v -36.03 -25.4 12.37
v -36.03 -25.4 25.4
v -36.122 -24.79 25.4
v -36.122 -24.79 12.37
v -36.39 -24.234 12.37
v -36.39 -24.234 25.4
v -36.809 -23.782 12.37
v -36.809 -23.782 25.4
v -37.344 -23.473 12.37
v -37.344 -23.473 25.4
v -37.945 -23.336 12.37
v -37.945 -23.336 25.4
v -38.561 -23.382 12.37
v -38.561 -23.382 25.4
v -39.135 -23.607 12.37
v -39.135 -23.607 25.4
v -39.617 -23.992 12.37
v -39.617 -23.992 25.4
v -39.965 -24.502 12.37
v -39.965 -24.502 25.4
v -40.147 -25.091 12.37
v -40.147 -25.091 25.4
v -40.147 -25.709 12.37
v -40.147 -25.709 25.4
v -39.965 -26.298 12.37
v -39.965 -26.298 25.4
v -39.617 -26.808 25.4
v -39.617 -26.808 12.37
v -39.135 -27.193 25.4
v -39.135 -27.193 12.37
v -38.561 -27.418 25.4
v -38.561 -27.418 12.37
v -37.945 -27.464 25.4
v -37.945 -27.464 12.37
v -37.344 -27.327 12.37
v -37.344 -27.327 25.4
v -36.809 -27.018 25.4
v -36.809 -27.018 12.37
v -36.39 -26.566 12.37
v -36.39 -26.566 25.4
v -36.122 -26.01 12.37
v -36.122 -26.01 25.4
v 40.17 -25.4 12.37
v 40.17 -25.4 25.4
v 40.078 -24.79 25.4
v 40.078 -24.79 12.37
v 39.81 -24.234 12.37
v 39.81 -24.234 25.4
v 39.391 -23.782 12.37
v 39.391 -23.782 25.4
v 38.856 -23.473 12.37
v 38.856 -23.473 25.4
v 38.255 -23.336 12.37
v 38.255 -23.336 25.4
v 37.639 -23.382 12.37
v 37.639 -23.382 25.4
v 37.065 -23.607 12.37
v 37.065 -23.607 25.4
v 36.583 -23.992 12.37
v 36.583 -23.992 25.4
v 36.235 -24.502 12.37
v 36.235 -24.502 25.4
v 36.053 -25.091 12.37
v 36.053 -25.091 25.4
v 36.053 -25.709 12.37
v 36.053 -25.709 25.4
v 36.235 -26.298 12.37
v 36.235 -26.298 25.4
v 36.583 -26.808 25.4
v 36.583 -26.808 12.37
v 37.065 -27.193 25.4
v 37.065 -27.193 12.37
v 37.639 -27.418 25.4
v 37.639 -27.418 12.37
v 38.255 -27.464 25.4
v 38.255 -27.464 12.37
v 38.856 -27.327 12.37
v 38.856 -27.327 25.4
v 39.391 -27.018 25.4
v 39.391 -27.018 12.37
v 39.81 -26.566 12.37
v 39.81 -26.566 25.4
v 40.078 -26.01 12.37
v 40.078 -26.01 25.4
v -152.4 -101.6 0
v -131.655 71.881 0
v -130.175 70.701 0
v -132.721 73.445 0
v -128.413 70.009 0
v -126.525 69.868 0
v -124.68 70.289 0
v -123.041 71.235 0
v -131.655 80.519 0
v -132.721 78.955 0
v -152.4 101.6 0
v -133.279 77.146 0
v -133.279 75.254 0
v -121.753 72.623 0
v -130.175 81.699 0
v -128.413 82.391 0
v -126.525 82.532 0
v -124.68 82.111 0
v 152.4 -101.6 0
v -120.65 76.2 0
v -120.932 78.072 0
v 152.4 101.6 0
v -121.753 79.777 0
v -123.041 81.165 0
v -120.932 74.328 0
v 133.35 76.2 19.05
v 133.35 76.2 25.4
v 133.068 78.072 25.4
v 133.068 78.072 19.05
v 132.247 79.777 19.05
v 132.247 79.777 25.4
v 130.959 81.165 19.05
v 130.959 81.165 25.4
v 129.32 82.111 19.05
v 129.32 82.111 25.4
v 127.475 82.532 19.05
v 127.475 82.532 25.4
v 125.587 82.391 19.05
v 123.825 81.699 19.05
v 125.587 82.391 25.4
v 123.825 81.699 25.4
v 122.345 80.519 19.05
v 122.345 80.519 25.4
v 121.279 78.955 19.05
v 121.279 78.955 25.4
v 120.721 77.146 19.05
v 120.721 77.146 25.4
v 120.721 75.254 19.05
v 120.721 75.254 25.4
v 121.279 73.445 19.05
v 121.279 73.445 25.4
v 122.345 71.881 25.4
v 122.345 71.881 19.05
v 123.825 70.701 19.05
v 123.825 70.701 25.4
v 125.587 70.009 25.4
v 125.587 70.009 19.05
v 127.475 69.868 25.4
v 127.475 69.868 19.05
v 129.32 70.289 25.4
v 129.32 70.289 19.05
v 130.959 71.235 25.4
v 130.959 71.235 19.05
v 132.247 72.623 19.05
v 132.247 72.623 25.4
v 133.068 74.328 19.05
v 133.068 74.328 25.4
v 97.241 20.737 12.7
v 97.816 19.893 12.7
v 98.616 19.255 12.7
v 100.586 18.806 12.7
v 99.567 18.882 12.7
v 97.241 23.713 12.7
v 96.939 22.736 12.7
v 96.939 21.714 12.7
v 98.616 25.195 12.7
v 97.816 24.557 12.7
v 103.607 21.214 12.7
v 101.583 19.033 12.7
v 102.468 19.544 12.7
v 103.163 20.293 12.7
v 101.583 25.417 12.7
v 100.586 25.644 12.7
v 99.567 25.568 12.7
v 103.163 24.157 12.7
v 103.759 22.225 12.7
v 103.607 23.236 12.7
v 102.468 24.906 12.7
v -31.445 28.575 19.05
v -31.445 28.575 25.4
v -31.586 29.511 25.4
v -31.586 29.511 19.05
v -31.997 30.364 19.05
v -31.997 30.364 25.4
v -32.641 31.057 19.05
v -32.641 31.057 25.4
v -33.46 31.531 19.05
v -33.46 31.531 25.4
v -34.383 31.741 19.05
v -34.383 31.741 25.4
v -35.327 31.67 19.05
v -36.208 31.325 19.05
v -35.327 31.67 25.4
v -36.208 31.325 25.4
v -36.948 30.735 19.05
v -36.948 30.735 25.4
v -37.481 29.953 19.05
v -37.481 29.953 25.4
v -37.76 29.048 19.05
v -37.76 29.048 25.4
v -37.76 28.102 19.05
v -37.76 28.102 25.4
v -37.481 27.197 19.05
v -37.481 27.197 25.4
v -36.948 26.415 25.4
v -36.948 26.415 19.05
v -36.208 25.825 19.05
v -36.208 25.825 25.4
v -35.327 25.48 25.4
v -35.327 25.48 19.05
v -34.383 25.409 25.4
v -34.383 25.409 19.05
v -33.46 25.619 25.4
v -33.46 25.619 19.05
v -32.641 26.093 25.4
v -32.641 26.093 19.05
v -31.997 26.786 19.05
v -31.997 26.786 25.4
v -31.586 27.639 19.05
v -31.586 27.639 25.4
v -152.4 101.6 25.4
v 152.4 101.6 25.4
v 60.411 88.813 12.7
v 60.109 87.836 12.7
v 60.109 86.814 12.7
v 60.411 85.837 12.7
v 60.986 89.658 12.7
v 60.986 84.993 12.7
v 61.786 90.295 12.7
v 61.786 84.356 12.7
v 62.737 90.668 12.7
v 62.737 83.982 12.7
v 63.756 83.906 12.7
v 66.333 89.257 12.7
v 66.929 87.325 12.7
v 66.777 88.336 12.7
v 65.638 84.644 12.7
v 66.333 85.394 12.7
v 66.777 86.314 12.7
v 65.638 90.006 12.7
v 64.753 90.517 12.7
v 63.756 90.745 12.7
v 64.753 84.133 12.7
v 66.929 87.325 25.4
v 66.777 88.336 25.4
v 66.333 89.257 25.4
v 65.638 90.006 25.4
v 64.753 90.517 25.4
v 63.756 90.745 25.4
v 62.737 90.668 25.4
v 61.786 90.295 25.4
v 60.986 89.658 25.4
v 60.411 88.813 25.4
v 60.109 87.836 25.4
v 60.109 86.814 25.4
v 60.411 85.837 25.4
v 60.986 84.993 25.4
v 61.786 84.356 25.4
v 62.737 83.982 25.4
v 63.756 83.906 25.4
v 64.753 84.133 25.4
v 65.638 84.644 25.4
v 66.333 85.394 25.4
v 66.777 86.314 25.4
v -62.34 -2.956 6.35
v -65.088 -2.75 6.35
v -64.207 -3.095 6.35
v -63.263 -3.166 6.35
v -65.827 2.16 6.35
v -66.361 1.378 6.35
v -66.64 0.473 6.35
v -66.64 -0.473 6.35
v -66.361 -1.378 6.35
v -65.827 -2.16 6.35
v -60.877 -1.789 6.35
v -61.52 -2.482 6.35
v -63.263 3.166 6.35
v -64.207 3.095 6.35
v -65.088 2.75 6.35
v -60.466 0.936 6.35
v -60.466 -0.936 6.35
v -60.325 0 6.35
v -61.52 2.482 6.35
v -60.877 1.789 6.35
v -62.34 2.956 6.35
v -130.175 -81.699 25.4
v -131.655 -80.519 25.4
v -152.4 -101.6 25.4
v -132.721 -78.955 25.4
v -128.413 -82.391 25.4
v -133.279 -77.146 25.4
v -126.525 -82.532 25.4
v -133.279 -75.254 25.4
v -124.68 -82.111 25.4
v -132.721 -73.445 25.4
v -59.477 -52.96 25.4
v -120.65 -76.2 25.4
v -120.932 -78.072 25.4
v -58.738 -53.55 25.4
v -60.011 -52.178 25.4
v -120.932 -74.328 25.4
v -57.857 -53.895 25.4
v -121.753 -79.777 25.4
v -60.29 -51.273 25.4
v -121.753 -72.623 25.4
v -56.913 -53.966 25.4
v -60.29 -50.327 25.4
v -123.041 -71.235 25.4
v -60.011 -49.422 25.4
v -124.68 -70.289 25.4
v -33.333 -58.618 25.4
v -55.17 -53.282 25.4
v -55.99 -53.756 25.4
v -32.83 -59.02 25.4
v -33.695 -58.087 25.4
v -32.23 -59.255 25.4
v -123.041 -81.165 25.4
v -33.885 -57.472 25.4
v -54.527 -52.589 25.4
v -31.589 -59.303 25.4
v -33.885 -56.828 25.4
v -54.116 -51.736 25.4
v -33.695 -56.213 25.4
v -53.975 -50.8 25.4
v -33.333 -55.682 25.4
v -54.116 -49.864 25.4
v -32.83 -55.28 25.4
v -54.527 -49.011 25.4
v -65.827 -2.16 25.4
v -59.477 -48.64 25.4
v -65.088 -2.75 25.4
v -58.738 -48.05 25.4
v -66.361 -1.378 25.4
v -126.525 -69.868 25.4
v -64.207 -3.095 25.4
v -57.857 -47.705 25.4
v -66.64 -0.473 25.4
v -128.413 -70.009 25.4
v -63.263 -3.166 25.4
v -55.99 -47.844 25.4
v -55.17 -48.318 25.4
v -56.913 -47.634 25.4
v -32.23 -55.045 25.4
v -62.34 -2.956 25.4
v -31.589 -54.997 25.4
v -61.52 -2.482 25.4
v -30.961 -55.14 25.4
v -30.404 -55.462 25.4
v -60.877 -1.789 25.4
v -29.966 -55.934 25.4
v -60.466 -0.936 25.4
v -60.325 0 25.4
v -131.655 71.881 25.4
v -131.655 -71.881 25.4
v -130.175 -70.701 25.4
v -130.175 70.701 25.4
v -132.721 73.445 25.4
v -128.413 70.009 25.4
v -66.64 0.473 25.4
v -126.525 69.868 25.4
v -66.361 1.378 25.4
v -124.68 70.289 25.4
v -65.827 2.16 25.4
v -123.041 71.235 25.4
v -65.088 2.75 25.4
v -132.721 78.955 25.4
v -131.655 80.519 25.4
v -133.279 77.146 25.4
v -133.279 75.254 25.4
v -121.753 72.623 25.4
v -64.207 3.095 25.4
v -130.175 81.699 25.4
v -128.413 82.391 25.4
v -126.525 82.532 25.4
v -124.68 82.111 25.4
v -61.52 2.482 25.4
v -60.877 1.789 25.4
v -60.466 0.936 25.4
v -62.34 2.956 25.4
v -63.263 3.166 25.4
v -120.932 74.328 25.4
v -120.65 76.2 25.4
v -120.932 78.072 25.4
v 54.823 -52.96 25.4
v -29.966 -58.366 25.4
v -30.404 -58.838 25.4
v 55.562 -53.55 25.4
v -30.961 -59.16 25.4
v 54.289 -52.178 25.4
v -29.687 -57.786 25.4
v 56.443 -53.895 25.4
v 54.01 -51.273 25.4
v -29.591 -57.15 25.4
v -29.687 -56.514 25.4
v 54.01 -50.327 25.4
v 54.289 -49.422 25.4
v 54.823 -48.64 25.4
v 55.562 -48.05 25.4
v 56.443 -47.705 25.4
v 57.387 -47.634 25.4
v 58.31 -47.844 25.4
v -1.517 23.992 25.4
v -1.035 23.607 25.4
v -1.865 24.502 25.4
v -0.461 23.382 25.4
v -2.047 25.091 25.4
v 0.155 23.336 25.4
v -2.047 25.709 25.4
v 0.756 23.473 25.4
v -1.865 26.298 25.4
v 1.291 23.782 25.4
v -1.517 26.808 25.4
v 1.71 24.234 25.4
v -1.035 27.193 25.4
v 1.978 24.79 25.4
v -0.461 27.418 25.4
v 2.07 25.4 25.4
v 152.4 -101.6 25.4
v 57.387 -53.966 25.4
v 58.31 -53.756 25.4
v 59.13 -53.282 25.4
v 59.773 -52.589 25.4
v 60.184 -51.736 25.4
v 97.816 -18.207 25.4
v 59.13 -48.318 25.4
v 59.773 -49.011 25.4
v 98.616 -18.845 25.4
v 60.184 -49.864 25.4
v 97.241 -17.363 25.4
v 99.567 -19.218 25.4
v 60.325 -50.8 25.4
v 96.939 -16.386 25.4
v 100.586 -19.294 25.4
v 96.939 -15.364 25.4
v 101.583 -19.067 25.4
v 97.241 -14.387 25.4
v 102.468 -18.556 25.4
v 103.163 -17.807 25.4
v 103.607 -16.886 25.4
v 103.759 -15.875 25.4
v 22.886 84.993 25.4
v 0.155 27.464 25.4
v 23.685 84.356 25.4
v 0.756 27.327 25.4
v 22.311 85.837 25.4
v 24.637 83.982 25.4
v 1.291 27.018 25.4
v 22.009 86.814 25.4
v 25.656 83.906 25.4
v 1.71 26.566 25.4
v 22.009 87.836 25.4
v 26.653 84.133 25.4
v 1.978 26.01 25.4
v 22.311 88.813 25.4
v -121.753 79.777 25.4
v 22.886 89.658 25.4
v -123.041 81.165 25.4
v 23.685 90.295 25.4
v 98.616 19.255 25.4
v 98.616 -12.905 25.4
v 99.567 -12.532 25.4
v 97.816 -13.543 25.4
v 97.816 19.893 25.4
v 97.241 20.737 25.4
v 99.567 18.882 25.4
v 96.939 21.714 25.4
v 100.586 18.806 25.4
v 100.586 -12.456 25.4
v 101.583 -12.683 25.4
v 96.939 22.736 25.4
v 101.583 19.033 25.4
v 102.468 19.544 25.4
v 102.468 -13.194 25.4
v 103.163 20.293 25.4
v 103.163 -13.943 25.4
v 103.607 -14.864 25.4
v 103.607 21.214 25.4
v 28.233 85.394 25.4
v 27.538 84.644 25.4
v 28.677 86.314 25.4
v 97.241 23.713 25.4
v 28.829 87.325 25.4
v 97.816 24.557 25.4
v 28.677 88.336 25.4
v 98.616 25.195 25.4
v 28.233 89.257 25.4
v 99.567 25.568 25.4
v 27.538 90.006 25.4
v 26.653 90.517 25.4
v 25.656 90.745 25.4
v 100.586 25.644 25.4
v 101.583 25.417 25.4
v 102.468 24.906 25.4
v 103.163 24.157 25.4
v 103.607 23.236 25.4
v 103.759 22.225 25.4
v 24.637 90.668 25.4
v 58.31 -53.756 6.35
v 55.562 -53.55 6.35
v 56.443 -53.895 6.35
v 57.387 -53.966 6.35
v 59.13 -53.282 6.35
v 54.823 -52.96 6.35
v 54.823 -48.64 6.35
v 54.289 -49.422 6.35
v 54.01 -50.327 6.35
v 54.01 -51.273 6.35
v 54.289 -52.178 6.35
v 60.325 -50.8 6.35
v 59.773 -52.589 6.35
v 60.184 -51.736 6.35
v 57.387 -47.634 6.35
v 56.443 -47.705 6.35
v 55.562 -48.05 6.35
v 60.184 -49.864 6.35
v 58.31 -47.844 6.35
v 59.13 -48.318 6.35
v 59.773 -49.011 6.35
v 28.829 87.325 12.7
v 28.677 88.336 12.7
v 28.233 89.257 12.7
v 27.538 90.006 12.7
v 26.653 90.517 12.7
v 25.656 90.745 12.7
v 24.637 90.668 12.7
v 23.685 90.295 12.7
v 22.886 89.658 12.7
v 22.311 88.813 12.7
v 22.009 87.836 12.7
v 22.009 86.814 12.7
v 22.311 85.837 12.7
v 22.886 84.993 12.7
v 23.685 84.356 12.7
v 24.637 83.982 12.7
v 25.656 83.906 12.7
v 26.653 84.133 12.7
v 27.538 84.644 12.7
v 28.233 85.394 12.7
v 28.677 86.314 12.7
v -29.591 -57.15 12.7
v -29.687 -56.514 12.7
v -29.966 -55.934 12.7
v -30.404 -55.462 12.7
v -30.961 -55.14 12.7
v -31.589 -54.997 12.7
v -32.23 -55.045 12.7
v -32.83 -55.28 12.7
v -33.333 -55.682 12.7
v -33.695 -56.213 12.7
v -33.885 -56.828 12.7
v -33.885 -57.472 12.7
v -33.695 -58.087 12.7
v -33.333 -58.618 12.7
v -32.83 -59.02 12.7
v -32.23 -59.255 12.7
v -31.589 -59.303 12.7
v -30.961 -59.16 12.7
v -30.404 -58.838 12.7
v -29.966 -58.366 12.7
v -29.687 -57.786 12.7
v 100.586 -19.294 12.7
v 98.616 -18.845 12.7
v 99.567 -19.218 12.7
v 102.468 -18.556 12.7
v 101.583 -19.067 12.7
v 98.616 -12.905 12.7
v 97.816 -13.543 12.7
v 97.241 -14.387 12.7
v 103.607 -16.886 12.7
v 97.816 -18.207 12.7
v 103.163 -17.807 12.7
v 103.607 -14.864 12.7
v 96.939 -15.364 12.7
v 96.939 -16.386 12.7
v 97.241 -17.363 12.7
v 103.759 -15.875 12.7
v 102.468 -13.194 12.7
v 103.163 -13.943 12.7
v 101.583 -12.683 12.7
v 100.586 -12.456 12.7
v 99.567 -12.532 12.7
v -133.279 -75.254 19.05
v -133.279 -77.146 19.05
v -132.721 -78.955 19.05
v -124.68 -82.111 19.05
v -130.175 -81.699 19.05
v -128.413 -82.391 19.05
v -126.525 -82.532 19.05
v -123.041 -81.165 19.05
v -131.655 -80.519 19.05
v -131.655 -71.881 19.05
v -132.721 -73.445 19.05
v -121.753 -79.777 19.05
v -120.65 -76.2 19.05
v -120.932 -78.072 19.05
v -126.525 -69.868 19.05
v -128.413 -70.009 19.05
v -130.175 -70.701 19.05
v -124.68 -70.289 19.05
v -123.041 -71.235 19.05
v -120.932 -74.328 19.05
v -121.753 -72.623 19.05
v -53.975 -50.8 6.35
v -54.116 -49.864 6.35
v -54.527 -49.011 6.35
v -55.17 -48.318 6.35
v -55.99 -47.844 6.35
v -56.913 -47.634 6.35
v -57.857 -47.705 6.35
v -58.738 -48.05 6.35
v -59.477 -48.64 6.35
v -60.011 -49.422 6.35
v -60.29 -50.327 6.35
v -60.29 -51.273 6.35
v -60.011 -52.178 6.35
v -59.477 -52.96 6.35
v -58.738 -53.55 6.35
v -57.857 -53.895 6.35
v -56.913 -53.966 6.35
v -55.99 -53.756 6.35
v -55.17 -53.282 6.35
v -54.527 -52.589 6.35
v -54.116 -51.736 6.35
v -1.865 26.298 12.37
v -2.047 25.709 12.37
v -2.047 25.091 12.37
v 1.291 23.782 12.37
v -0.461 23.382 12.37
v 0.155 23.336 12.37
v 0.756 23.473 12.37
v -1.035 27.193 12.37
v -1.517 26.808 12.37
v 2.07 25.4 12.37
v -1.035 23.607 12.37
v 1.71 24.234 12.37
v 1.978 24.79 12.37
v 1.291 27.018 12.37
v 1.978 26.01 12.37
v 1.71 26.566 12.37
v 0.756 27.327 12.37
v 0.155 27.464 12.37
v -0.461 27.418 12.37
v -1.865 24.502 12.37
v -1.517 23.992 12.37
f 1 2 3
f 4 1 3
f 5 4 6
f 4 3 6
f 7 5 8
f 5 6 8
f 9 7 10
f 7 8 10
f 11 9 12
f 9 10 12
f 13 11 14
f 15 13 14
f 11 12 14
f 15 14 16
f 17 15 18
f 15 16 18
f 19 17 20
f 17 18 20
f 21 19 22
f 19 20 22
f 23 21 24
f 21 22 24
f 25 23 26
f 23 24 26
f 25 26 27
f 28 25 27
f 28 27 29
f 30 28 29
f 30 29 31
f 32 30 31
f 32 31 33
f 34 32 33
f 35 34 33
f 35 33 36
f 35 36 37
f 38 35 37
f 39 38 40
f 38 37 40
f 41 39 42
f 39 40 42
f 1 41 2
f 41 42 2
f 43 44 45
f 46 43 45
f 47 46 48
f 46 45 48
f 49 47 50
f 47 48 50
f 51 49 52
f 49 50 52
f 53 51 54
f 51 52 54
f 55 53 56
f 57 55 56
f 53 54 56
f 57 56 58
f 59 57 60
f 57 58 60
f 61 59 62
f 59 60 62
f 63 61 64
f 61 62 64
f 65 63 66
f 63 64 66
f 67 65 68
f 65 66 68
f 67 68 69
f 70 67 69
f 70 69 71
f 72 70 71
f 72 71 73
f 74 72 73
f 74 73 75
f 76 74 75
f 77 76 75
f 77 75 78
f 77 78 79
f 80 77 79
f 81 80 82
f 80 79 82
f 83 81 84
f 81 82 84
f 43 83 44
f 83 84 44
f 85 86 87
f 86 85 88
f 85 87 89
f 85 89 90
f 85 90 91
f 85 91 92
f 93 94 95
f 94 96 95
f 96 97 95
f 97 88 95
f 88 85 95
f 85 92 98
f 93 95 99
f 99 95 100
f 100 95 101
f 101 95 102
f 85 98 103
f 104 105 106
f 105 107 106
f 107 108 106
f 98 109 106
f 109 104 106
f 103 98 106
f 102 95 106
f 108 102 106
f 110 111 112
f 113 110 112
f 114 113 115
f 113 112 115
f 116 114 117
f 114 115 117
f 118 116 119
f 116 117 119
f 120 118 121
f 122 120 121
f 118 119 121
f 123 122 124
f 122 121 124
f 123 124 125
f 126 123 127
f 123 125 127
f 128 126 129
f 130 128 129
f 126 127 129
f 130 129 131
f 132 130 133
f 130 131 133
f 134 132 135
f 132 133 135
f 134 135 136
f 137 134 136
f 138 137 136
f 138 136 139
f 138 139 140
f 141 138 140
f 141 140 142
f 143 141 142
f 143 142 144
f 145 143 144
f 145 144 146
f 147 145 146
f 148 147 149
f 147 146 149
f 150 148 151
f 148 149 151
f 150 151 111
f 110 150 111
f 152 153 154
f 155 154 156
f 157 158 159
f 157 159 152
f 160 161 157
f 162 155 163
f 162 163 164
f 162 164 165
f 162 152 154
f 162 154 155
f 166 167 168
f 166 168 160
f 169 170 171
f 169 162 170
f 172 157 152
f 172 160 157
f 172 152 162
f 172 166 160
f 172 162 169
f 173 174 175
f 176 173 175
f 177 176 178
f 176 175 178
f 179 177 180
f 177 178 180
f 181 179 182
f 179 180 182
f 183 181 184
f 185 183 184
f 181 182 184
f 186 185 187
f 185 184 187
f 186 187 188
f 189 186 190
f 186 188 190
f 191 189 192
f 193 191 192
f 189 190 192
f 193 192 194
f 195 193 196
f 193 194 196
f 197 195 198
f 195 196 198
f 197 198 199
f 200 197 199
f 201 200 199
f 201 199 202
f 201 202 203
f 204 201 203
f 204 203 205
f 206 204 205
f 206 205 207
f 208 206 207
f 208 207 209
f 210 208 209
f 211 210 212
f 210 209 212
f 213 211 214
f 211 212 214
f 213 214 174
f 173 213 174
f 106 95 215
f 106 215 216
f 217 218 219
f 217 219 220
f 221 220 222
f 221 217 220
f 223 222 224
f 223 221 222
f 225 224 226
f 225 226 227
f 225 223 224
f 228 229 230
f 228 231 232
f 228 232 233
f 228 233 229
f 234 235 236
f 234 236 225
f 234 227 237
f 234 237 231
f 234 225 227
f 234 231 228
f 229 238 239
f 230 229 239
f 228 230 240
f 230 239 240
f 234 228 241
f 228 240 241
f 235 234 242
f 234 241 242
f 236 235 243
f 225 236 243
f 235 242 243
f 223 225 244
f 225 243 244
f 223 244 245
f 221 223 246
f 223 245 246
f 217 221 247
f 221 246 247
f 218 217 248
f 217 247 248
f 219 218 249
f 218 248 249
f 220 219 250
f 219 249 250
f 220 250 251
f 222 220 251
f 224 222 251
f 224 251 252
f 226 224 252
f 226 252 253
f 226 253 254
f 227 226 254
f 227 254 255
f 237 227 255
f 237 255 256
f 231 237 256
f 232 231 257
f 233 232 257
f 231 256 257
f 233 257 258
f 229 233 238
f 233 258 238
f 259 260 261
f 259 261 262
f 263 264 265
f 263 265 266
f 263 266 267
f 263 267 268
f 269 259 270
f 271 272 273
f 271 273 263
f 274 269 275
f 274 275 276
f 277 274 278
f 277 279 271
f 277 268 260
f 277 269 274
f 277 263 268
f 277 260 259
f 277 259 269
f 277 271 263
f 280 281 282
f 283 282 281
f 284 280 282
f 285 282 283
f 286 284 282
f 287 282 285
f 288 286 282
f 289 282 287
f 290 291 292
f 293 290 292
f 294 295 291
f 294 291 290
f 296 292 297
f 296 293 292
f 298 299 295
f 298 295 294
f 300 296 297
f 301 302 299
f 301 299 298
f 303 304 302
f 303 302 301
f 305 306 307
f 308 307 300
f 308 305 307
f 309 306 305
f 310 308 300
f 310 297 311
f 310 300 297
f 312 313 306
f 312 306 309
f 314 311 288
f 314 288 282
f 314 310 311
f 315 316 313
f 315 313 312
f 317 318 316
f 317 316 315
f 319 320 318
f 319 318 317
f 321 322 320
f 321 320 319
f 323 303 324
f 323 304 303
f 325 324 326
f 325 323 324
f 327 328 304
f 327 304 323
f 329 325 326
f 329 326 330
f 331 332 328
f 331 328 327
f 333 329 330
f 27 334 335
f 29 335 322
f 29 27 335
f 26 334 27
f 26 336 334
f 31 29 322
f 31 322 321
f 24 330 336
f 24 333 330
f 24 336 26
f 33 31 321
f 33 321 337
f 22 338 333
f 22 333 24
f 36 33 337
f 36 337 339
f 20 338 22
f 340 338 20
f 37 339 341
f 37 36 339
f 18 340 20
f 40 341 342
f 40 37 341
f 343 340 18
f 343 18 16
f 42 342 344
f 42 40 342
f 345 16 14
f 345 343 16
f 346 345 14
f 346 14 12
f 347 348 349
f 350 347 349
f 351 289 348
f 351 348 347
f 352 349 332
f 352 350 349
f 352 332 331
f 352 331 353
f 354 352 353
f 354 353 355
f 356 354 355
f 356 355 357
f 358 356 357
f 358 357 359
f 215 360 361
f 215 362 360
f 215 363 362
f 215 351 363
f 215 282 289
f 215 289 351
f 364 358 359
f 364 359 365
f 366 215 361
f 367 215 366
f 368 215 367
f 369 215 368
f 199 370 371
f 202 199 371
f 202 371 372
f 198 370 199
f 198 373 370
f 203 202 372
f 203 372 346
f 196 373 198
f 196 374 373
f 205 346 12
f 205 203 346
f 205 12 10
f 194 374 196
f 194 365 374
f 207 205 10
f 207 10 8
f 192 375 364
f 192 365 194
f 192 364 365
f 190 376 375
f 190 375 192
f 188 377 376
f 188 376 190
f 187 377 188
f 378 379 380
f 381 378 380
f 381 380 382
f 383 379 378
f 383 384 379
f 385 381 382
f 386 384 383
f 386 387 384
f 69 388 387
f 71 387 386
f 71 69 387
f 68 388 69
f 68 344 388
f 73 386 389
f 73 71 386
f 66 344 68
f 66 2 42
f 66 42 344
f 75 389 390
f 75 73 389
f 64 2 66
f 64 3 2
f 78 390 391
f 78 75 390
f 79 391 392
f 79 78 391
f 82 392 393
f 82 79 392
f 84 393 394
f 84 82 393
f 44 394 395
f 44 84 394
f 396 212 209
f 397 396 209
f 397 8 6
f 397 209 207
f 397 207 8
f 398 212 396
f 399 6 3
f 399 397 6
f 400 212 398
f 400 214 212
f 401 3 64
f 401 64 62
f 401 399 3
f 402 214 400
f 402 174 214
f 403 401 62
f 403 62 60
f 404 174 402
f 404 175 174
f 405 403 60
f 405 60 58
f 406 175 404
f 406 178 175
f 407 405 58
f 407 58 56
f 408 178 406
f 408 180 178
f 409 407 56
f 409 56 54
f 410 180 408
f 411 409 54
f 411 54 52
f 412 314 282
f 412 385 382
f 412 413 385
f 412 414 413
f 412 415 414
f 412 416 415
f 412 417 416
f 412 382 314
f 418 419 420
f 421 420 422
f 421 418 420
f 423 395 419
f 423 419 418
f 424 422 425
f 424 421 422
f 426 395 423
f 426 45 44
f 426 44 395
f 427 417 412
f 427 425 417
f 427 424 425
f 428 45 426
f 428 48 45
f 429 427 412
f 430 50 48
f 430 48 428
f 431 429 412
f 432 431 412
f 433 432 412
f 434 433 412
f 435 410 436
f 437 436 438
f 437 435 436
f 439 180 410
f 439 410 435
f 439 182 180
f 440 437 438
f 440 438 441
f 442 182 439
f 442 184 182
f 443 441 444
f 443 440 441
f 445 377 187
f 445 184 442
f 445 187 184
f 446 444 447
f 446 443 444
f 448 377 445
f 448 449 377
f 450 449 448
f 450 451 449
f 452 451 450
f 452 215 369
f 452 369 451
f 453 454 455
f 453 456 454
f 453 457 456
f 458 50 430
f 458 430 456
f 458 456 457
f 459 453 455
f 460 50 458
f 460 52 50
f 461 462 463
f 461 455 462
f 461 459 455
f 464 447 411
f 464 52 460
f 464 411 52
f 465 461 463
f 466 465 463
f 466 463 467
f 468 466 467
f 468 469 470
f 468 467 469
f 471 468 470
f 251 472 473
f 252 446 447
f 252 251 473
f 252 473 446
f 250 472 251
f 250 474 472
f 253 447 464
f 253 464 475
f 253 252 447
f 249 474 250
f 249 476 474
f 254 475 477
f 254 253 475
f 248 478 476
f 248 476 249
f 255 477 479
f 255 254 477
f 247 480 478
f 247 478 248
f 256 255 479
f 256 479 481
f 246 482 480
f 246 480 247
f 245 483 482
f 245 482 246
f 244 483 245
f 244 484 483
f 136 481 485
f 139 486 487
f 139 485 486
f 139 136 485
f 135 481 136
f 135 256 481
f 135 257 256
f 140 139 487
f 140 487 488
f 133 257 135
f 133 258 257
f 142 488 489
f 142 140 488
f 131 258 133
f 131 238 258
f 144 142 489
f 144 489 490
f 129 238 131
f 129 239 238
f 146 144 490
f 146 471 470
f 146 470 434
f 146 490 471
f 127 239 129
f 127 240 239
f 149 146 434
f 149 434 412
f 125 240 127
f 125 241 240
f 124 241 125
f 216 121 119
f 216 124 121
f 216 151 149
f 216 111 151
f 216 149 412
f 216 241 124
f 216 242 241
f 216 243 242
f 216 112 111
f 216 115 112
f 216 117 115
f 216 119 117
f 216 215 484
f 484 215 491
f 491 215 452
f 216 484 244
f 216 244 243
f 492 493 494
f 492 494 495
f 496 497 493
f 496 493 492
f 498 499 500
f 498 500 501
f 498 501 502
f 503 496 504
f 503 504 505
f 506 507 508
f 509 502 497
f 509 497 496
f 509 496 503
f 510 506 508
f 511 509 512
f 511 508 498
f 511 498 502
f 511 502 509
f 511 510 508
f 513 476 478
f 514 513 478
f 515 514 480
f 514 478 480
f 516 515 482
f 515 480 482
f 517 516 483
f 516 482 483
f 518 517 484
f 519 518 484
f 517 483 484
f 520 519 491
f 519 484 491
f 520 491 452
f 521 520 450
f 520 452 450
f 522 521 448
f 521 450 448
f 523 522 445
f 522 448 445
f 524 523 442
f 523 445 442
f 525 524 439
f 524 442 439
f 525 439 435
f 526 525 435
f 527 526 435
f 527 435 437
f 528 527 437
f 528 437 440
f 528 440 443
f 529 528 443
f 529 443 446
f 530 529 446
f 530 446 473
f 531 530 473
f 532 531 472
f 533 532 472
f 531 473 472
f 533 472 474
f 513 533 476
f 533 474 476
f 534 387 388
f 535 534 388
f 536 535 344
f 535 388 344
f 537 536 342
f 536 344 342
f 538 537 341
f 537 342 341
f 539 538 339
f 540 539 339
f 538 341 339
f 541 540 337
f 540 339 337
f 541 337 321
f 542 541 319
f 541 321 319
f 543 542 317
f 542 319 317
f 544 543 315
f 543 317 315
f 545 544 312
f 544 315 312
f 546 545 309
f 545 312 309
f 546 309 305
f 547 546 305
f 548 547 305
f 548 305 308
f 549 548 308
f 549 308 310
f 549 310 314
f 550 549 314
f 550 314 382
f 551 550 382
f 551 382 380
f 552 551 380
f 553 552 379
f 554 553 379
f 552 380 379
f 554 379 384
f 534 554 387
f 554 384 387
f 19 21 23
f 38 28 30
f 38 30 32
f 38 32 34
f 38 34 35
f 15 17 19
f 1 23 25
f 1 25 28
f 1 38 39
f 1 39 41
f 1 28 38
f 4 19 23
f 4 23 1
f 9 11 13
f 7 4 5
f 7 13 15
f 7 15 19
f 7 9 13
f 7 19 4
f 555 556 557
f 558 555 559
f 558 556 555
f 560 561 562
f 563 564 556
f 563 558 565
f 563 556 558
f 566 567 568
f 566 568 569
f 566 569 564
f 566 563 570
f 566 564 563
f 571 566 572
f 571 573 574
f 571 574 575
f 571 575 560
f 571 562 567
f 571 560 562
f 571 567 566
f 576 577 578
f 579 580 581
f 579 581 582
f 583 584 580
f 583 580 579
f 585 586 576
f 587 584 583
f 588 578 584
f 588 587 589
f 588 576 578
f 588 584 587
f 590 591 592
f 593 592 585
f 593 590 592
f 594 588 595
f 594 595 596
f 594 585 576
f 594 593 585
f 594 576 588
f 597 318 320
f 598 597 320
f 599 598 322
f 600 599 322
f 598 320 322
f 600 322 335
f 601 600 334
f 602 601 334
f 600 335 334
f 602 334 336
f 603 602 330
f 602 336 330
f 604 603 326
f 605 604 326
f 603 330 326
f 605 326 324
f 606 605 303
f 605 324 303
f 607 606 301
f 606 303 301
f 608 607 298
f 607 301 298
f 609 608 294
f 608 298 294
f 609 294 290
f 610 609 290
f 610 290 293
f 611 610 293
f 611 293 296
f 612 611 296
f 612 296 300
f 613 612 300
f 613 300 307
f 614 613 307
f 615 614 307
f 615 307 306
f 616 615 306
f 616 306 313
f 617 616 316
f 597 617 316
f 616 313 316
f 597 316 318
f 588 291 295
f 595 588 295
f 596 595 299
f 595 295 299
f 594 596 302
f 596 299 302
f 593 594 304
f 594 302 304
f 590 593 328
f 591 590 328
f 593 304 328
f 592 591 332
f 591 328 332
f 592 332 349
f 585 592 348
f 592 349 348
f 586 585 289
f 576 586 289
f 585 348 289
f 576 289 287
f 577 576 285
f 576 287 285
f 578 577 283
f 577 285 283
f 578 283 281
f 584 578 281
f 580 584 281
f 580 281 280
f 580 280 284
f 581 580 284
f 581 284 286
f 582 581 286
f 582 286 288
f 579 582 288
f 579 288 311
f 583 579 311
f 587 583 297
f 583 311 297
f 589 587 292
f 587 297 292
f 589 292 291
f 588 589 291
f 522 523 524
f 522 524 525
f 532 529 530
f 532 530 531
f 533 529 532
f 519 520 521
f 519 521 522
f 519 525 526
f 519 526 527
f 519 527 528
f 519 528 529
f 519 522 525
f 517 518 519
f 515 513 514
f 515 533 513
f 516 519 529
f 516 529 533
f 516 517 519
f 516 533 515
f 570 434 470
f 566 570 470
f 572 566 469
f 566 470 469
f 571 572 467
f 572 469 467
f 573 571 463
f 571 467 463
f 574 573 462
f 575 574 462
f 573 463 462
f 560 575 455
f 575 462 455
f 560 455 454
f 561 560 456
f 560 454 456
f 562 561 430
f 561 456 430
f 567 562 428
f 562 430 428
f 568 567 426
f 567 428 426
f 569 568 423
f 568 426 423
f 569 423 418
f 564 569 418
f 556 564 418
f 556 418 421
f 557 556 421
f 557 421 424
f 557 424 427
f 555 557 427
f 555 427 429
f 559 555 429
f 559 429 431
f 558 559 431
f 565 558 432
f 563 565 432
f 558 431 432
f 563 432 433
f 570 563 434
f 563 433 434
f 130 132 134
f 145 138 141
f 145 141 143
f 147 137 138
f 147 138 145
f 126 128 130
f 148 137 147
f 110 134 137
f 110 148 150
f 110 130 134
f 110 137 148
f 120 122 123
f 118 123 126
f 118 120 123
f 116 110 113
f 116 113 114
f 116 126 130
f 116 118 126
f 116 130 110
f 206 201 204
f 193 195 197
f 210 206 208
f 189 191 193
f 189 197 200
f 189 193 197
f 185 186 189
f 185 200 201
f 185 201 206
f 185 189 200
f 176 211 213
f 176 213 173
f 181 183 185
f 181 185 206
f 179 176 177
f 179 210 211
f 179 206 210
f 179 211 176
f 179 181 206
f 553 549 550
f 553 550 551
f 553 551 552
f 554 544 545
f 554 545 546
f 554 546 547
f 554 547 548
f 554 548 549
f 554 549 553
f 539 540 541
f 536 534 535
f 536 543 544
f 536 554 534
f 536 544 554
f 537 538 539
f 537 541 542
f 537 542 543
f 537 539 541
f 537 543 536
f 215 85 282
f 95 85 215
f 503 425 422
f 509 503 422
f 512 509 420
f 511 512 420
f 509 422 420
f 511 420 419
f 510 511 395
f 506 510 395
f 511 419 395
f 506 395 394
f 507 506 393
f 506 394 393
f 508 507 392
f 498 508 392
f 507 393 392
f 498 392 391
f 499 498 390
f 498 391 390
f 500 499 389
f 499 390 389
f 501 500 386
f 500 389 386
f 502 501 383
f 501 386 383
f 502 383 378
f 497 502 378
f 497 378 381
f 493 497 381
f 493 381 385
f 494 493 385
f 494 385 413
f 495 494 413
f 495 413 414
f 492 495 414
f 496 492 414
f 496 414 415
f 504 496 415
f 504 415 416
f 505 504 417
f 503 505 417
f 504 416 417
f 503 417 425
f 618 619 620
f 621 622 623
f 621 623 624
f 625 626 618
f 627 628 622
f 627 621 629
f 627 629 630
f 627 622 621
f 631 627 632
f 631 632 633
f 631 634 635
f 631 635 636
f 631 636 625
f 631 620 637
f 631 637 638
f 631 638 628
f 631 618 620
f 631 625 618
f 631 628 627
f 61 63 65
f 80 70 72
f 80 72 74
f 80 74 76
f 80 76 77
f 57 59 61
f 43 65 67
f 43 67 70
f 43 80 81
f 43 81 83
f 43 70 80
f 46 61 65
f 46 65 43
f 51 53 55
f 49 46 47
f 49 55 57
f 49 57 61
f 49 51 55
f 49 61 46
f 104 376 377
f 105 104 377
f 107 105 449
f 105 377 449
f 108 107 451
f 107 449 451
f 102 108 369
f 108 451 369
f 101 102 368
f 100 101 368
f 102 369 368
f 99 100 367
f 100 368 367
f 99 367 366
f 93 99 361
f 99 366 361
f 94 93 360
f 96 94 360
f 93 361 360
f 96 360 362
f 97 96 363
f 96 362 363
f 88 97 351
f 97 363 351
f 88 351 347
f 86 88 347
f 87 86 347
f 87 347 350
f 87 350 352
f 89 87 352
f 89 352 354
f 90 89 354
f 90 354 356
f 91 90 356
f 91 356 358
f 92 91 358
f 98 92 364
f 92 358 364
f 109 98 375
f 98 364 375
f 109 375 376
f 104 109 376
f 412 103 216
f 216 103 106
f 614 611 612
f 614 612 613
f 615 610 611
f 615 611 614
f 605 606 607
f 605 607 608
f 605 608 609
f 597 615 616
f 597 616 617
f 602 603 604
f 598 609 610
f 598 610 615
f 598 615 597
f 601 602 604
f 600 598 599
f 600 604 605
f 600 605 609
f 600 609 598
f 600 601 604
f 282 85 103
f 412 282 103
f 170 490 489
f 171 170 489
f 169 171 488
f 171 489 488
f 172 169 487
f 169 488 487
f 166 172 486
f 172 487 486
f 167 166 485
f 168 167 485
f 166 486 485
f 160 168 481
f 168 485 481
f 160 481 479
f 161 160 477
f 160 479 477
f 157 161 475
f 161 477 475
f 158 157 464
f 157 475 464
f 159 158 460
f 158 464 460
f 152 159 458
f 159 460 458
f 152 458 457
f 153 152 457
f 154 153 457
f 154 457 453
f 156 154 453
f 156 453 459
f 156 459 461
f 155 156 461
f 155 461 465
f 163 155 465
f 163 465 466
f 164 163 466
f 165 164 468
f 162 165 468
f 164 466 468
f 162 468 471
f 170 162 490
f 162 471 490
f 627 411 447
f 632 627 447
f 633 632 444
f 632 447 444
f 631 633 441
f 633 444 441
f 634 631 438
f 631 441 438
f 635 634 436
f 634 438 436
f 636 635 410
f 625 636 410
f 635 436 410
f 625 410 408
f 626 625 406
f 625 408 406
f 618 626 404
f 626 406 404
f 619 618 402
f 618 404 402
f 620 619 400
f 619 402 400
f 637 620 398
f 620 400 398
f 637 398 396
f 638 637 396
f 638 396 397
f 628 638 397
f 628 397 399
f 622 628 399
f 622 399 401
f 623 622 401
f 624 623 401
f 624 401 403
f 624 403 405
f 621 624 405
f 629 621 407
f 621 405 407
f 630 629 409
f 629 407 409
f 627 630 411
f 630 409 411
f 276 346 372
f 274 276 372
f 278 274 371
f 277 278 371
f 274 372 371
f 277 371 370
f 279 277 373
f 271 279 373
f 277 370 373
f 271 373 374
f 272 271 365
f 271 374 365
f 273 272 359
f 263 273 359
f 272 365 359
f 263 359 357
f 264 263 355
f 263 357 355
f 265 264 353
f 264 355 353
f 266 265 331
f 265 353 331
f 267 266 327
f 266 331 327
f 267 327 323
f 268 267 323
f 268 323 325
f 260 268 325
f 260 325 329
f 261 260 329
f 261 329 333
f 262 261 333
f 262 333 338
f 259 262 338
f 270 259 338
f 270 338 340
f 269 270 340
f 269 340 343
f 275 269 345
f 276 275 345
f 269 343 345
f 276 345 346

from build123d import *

# Parameters (mm, degrees)
F0_W      = 304.8
F0_H      = 203.2
F1_DEPTH  = 25.4
F2_R      = 6.35
F3_DEPTH  = 6.35
F4_R      = 3.175
F5_DEPTH  = 19.05
F6_R      = 2.0701
F7_DEPTH  = 13.0302
F8_R      = 3.429
F9_DEPTH  = 12.7
F10_R     = 3.175
F11_DEPTH = 6.35
F12_R     = 3.429
F13_DEPTH = 12.7
F14_R     = 2.159
F15_DEPTH = 12.7
F16_R     = 6.35
F17_DEPTH = 25.4


with BuildPart() as f1:
    # F0 (on Top) → F1 (new body)
    with BuildSketch(Plane.XY):
        Rectangle(F0_W, F0_H)
    extrude(amount=F1_DEPTH)

    # F2 (on face) → F3 (cut)
    with BuildSketch(Plane.XY.offset(25.4)):
        with Locations((-127, -76.2)):
            Circle(F2_R)
        with Locations((127, 76.2)):
            Circle(F2_R)
    extrude(amount=-F3_DEPTH, mode=Mode.SUBTRACT)

    # F4 (on face) → F5 (cut)
    with BuildSketch(Plane.XY.offset(25.4)):
        with Locations((-57.15, -50.8)):
            Circle(F4_R)
        with Locations((57.15, -50.8)):
            Circle(F4_R)
        with Locations((-63.5, 0)):
            Circle(F4_R)
    extrude(amount=-F5_DEPTH, mode=Mode.SUBTRACT)

    # F6 (on face) → F7 (cut)
    with BuildSketch(Plane.XY.offset(25.4)):
        with Locations((0, 25.4)):
            Circle(F6_R)
        with Locations((-38.1, -25.4)):
            Circle(F6_R)
        with Locations((38.1, -25.4)):
            Circle(F6_R)
    extrude(amount=-F7_DEPTH, mode=Mode.SUBTRACT)

    # F8 (on face) → F9 (cut)
    with BuildSketch(Plane.XY.offset(25.4)):
        with Locations((25.4, 87.3252)):
            Circle(F8_R)
        with Locations((63.5, 87.3252)):
            Circle(F8_R)
    extrude(amount=-F9_DEPTH, mode=Mode.SUBTRACT)

    # F10 (on face) → F11 (cut)
    with BuildSketch(Plane.XY.offset(25.4)):
        with Locations((-34.6202, 28.575)):
            Circle(F10_R)
    extrude(amount=-F11_DEPTH, mode=Mode.SUBTRACT)

    # F12 (on face) → F13 (cut)
    with BuildSketch(Plane.XY.offset(25.4)):
        with Locations((100.33, 22.225)):
            Circle(F12_R)
        with Locations((100.33, -15.875)):
            Circle(F12_R)
    extrude(amount=-F13_DEPTH, mode=Mode.SUBTRACT)

    # F14 (on face) → F15 (cut)
    with BuildSketch(Plane.XY.offset(25.4)):
        with Locations((-31.75, -57.15)):
            Circle(F14_R)
    extrude(amount=-F15_DEPTH, mode=Mode.SUBTRACT)

    # F16 (on face) → F17 (cut)
    with BuildSketch(Plane.XY.offset(25.4)):
        with Locations((-127, 76.2)):
            Circle(F16_R)
    extrude(amount=-F17_DEPTH, mode=Mode.SUBTRACT)


solid = f1.part
